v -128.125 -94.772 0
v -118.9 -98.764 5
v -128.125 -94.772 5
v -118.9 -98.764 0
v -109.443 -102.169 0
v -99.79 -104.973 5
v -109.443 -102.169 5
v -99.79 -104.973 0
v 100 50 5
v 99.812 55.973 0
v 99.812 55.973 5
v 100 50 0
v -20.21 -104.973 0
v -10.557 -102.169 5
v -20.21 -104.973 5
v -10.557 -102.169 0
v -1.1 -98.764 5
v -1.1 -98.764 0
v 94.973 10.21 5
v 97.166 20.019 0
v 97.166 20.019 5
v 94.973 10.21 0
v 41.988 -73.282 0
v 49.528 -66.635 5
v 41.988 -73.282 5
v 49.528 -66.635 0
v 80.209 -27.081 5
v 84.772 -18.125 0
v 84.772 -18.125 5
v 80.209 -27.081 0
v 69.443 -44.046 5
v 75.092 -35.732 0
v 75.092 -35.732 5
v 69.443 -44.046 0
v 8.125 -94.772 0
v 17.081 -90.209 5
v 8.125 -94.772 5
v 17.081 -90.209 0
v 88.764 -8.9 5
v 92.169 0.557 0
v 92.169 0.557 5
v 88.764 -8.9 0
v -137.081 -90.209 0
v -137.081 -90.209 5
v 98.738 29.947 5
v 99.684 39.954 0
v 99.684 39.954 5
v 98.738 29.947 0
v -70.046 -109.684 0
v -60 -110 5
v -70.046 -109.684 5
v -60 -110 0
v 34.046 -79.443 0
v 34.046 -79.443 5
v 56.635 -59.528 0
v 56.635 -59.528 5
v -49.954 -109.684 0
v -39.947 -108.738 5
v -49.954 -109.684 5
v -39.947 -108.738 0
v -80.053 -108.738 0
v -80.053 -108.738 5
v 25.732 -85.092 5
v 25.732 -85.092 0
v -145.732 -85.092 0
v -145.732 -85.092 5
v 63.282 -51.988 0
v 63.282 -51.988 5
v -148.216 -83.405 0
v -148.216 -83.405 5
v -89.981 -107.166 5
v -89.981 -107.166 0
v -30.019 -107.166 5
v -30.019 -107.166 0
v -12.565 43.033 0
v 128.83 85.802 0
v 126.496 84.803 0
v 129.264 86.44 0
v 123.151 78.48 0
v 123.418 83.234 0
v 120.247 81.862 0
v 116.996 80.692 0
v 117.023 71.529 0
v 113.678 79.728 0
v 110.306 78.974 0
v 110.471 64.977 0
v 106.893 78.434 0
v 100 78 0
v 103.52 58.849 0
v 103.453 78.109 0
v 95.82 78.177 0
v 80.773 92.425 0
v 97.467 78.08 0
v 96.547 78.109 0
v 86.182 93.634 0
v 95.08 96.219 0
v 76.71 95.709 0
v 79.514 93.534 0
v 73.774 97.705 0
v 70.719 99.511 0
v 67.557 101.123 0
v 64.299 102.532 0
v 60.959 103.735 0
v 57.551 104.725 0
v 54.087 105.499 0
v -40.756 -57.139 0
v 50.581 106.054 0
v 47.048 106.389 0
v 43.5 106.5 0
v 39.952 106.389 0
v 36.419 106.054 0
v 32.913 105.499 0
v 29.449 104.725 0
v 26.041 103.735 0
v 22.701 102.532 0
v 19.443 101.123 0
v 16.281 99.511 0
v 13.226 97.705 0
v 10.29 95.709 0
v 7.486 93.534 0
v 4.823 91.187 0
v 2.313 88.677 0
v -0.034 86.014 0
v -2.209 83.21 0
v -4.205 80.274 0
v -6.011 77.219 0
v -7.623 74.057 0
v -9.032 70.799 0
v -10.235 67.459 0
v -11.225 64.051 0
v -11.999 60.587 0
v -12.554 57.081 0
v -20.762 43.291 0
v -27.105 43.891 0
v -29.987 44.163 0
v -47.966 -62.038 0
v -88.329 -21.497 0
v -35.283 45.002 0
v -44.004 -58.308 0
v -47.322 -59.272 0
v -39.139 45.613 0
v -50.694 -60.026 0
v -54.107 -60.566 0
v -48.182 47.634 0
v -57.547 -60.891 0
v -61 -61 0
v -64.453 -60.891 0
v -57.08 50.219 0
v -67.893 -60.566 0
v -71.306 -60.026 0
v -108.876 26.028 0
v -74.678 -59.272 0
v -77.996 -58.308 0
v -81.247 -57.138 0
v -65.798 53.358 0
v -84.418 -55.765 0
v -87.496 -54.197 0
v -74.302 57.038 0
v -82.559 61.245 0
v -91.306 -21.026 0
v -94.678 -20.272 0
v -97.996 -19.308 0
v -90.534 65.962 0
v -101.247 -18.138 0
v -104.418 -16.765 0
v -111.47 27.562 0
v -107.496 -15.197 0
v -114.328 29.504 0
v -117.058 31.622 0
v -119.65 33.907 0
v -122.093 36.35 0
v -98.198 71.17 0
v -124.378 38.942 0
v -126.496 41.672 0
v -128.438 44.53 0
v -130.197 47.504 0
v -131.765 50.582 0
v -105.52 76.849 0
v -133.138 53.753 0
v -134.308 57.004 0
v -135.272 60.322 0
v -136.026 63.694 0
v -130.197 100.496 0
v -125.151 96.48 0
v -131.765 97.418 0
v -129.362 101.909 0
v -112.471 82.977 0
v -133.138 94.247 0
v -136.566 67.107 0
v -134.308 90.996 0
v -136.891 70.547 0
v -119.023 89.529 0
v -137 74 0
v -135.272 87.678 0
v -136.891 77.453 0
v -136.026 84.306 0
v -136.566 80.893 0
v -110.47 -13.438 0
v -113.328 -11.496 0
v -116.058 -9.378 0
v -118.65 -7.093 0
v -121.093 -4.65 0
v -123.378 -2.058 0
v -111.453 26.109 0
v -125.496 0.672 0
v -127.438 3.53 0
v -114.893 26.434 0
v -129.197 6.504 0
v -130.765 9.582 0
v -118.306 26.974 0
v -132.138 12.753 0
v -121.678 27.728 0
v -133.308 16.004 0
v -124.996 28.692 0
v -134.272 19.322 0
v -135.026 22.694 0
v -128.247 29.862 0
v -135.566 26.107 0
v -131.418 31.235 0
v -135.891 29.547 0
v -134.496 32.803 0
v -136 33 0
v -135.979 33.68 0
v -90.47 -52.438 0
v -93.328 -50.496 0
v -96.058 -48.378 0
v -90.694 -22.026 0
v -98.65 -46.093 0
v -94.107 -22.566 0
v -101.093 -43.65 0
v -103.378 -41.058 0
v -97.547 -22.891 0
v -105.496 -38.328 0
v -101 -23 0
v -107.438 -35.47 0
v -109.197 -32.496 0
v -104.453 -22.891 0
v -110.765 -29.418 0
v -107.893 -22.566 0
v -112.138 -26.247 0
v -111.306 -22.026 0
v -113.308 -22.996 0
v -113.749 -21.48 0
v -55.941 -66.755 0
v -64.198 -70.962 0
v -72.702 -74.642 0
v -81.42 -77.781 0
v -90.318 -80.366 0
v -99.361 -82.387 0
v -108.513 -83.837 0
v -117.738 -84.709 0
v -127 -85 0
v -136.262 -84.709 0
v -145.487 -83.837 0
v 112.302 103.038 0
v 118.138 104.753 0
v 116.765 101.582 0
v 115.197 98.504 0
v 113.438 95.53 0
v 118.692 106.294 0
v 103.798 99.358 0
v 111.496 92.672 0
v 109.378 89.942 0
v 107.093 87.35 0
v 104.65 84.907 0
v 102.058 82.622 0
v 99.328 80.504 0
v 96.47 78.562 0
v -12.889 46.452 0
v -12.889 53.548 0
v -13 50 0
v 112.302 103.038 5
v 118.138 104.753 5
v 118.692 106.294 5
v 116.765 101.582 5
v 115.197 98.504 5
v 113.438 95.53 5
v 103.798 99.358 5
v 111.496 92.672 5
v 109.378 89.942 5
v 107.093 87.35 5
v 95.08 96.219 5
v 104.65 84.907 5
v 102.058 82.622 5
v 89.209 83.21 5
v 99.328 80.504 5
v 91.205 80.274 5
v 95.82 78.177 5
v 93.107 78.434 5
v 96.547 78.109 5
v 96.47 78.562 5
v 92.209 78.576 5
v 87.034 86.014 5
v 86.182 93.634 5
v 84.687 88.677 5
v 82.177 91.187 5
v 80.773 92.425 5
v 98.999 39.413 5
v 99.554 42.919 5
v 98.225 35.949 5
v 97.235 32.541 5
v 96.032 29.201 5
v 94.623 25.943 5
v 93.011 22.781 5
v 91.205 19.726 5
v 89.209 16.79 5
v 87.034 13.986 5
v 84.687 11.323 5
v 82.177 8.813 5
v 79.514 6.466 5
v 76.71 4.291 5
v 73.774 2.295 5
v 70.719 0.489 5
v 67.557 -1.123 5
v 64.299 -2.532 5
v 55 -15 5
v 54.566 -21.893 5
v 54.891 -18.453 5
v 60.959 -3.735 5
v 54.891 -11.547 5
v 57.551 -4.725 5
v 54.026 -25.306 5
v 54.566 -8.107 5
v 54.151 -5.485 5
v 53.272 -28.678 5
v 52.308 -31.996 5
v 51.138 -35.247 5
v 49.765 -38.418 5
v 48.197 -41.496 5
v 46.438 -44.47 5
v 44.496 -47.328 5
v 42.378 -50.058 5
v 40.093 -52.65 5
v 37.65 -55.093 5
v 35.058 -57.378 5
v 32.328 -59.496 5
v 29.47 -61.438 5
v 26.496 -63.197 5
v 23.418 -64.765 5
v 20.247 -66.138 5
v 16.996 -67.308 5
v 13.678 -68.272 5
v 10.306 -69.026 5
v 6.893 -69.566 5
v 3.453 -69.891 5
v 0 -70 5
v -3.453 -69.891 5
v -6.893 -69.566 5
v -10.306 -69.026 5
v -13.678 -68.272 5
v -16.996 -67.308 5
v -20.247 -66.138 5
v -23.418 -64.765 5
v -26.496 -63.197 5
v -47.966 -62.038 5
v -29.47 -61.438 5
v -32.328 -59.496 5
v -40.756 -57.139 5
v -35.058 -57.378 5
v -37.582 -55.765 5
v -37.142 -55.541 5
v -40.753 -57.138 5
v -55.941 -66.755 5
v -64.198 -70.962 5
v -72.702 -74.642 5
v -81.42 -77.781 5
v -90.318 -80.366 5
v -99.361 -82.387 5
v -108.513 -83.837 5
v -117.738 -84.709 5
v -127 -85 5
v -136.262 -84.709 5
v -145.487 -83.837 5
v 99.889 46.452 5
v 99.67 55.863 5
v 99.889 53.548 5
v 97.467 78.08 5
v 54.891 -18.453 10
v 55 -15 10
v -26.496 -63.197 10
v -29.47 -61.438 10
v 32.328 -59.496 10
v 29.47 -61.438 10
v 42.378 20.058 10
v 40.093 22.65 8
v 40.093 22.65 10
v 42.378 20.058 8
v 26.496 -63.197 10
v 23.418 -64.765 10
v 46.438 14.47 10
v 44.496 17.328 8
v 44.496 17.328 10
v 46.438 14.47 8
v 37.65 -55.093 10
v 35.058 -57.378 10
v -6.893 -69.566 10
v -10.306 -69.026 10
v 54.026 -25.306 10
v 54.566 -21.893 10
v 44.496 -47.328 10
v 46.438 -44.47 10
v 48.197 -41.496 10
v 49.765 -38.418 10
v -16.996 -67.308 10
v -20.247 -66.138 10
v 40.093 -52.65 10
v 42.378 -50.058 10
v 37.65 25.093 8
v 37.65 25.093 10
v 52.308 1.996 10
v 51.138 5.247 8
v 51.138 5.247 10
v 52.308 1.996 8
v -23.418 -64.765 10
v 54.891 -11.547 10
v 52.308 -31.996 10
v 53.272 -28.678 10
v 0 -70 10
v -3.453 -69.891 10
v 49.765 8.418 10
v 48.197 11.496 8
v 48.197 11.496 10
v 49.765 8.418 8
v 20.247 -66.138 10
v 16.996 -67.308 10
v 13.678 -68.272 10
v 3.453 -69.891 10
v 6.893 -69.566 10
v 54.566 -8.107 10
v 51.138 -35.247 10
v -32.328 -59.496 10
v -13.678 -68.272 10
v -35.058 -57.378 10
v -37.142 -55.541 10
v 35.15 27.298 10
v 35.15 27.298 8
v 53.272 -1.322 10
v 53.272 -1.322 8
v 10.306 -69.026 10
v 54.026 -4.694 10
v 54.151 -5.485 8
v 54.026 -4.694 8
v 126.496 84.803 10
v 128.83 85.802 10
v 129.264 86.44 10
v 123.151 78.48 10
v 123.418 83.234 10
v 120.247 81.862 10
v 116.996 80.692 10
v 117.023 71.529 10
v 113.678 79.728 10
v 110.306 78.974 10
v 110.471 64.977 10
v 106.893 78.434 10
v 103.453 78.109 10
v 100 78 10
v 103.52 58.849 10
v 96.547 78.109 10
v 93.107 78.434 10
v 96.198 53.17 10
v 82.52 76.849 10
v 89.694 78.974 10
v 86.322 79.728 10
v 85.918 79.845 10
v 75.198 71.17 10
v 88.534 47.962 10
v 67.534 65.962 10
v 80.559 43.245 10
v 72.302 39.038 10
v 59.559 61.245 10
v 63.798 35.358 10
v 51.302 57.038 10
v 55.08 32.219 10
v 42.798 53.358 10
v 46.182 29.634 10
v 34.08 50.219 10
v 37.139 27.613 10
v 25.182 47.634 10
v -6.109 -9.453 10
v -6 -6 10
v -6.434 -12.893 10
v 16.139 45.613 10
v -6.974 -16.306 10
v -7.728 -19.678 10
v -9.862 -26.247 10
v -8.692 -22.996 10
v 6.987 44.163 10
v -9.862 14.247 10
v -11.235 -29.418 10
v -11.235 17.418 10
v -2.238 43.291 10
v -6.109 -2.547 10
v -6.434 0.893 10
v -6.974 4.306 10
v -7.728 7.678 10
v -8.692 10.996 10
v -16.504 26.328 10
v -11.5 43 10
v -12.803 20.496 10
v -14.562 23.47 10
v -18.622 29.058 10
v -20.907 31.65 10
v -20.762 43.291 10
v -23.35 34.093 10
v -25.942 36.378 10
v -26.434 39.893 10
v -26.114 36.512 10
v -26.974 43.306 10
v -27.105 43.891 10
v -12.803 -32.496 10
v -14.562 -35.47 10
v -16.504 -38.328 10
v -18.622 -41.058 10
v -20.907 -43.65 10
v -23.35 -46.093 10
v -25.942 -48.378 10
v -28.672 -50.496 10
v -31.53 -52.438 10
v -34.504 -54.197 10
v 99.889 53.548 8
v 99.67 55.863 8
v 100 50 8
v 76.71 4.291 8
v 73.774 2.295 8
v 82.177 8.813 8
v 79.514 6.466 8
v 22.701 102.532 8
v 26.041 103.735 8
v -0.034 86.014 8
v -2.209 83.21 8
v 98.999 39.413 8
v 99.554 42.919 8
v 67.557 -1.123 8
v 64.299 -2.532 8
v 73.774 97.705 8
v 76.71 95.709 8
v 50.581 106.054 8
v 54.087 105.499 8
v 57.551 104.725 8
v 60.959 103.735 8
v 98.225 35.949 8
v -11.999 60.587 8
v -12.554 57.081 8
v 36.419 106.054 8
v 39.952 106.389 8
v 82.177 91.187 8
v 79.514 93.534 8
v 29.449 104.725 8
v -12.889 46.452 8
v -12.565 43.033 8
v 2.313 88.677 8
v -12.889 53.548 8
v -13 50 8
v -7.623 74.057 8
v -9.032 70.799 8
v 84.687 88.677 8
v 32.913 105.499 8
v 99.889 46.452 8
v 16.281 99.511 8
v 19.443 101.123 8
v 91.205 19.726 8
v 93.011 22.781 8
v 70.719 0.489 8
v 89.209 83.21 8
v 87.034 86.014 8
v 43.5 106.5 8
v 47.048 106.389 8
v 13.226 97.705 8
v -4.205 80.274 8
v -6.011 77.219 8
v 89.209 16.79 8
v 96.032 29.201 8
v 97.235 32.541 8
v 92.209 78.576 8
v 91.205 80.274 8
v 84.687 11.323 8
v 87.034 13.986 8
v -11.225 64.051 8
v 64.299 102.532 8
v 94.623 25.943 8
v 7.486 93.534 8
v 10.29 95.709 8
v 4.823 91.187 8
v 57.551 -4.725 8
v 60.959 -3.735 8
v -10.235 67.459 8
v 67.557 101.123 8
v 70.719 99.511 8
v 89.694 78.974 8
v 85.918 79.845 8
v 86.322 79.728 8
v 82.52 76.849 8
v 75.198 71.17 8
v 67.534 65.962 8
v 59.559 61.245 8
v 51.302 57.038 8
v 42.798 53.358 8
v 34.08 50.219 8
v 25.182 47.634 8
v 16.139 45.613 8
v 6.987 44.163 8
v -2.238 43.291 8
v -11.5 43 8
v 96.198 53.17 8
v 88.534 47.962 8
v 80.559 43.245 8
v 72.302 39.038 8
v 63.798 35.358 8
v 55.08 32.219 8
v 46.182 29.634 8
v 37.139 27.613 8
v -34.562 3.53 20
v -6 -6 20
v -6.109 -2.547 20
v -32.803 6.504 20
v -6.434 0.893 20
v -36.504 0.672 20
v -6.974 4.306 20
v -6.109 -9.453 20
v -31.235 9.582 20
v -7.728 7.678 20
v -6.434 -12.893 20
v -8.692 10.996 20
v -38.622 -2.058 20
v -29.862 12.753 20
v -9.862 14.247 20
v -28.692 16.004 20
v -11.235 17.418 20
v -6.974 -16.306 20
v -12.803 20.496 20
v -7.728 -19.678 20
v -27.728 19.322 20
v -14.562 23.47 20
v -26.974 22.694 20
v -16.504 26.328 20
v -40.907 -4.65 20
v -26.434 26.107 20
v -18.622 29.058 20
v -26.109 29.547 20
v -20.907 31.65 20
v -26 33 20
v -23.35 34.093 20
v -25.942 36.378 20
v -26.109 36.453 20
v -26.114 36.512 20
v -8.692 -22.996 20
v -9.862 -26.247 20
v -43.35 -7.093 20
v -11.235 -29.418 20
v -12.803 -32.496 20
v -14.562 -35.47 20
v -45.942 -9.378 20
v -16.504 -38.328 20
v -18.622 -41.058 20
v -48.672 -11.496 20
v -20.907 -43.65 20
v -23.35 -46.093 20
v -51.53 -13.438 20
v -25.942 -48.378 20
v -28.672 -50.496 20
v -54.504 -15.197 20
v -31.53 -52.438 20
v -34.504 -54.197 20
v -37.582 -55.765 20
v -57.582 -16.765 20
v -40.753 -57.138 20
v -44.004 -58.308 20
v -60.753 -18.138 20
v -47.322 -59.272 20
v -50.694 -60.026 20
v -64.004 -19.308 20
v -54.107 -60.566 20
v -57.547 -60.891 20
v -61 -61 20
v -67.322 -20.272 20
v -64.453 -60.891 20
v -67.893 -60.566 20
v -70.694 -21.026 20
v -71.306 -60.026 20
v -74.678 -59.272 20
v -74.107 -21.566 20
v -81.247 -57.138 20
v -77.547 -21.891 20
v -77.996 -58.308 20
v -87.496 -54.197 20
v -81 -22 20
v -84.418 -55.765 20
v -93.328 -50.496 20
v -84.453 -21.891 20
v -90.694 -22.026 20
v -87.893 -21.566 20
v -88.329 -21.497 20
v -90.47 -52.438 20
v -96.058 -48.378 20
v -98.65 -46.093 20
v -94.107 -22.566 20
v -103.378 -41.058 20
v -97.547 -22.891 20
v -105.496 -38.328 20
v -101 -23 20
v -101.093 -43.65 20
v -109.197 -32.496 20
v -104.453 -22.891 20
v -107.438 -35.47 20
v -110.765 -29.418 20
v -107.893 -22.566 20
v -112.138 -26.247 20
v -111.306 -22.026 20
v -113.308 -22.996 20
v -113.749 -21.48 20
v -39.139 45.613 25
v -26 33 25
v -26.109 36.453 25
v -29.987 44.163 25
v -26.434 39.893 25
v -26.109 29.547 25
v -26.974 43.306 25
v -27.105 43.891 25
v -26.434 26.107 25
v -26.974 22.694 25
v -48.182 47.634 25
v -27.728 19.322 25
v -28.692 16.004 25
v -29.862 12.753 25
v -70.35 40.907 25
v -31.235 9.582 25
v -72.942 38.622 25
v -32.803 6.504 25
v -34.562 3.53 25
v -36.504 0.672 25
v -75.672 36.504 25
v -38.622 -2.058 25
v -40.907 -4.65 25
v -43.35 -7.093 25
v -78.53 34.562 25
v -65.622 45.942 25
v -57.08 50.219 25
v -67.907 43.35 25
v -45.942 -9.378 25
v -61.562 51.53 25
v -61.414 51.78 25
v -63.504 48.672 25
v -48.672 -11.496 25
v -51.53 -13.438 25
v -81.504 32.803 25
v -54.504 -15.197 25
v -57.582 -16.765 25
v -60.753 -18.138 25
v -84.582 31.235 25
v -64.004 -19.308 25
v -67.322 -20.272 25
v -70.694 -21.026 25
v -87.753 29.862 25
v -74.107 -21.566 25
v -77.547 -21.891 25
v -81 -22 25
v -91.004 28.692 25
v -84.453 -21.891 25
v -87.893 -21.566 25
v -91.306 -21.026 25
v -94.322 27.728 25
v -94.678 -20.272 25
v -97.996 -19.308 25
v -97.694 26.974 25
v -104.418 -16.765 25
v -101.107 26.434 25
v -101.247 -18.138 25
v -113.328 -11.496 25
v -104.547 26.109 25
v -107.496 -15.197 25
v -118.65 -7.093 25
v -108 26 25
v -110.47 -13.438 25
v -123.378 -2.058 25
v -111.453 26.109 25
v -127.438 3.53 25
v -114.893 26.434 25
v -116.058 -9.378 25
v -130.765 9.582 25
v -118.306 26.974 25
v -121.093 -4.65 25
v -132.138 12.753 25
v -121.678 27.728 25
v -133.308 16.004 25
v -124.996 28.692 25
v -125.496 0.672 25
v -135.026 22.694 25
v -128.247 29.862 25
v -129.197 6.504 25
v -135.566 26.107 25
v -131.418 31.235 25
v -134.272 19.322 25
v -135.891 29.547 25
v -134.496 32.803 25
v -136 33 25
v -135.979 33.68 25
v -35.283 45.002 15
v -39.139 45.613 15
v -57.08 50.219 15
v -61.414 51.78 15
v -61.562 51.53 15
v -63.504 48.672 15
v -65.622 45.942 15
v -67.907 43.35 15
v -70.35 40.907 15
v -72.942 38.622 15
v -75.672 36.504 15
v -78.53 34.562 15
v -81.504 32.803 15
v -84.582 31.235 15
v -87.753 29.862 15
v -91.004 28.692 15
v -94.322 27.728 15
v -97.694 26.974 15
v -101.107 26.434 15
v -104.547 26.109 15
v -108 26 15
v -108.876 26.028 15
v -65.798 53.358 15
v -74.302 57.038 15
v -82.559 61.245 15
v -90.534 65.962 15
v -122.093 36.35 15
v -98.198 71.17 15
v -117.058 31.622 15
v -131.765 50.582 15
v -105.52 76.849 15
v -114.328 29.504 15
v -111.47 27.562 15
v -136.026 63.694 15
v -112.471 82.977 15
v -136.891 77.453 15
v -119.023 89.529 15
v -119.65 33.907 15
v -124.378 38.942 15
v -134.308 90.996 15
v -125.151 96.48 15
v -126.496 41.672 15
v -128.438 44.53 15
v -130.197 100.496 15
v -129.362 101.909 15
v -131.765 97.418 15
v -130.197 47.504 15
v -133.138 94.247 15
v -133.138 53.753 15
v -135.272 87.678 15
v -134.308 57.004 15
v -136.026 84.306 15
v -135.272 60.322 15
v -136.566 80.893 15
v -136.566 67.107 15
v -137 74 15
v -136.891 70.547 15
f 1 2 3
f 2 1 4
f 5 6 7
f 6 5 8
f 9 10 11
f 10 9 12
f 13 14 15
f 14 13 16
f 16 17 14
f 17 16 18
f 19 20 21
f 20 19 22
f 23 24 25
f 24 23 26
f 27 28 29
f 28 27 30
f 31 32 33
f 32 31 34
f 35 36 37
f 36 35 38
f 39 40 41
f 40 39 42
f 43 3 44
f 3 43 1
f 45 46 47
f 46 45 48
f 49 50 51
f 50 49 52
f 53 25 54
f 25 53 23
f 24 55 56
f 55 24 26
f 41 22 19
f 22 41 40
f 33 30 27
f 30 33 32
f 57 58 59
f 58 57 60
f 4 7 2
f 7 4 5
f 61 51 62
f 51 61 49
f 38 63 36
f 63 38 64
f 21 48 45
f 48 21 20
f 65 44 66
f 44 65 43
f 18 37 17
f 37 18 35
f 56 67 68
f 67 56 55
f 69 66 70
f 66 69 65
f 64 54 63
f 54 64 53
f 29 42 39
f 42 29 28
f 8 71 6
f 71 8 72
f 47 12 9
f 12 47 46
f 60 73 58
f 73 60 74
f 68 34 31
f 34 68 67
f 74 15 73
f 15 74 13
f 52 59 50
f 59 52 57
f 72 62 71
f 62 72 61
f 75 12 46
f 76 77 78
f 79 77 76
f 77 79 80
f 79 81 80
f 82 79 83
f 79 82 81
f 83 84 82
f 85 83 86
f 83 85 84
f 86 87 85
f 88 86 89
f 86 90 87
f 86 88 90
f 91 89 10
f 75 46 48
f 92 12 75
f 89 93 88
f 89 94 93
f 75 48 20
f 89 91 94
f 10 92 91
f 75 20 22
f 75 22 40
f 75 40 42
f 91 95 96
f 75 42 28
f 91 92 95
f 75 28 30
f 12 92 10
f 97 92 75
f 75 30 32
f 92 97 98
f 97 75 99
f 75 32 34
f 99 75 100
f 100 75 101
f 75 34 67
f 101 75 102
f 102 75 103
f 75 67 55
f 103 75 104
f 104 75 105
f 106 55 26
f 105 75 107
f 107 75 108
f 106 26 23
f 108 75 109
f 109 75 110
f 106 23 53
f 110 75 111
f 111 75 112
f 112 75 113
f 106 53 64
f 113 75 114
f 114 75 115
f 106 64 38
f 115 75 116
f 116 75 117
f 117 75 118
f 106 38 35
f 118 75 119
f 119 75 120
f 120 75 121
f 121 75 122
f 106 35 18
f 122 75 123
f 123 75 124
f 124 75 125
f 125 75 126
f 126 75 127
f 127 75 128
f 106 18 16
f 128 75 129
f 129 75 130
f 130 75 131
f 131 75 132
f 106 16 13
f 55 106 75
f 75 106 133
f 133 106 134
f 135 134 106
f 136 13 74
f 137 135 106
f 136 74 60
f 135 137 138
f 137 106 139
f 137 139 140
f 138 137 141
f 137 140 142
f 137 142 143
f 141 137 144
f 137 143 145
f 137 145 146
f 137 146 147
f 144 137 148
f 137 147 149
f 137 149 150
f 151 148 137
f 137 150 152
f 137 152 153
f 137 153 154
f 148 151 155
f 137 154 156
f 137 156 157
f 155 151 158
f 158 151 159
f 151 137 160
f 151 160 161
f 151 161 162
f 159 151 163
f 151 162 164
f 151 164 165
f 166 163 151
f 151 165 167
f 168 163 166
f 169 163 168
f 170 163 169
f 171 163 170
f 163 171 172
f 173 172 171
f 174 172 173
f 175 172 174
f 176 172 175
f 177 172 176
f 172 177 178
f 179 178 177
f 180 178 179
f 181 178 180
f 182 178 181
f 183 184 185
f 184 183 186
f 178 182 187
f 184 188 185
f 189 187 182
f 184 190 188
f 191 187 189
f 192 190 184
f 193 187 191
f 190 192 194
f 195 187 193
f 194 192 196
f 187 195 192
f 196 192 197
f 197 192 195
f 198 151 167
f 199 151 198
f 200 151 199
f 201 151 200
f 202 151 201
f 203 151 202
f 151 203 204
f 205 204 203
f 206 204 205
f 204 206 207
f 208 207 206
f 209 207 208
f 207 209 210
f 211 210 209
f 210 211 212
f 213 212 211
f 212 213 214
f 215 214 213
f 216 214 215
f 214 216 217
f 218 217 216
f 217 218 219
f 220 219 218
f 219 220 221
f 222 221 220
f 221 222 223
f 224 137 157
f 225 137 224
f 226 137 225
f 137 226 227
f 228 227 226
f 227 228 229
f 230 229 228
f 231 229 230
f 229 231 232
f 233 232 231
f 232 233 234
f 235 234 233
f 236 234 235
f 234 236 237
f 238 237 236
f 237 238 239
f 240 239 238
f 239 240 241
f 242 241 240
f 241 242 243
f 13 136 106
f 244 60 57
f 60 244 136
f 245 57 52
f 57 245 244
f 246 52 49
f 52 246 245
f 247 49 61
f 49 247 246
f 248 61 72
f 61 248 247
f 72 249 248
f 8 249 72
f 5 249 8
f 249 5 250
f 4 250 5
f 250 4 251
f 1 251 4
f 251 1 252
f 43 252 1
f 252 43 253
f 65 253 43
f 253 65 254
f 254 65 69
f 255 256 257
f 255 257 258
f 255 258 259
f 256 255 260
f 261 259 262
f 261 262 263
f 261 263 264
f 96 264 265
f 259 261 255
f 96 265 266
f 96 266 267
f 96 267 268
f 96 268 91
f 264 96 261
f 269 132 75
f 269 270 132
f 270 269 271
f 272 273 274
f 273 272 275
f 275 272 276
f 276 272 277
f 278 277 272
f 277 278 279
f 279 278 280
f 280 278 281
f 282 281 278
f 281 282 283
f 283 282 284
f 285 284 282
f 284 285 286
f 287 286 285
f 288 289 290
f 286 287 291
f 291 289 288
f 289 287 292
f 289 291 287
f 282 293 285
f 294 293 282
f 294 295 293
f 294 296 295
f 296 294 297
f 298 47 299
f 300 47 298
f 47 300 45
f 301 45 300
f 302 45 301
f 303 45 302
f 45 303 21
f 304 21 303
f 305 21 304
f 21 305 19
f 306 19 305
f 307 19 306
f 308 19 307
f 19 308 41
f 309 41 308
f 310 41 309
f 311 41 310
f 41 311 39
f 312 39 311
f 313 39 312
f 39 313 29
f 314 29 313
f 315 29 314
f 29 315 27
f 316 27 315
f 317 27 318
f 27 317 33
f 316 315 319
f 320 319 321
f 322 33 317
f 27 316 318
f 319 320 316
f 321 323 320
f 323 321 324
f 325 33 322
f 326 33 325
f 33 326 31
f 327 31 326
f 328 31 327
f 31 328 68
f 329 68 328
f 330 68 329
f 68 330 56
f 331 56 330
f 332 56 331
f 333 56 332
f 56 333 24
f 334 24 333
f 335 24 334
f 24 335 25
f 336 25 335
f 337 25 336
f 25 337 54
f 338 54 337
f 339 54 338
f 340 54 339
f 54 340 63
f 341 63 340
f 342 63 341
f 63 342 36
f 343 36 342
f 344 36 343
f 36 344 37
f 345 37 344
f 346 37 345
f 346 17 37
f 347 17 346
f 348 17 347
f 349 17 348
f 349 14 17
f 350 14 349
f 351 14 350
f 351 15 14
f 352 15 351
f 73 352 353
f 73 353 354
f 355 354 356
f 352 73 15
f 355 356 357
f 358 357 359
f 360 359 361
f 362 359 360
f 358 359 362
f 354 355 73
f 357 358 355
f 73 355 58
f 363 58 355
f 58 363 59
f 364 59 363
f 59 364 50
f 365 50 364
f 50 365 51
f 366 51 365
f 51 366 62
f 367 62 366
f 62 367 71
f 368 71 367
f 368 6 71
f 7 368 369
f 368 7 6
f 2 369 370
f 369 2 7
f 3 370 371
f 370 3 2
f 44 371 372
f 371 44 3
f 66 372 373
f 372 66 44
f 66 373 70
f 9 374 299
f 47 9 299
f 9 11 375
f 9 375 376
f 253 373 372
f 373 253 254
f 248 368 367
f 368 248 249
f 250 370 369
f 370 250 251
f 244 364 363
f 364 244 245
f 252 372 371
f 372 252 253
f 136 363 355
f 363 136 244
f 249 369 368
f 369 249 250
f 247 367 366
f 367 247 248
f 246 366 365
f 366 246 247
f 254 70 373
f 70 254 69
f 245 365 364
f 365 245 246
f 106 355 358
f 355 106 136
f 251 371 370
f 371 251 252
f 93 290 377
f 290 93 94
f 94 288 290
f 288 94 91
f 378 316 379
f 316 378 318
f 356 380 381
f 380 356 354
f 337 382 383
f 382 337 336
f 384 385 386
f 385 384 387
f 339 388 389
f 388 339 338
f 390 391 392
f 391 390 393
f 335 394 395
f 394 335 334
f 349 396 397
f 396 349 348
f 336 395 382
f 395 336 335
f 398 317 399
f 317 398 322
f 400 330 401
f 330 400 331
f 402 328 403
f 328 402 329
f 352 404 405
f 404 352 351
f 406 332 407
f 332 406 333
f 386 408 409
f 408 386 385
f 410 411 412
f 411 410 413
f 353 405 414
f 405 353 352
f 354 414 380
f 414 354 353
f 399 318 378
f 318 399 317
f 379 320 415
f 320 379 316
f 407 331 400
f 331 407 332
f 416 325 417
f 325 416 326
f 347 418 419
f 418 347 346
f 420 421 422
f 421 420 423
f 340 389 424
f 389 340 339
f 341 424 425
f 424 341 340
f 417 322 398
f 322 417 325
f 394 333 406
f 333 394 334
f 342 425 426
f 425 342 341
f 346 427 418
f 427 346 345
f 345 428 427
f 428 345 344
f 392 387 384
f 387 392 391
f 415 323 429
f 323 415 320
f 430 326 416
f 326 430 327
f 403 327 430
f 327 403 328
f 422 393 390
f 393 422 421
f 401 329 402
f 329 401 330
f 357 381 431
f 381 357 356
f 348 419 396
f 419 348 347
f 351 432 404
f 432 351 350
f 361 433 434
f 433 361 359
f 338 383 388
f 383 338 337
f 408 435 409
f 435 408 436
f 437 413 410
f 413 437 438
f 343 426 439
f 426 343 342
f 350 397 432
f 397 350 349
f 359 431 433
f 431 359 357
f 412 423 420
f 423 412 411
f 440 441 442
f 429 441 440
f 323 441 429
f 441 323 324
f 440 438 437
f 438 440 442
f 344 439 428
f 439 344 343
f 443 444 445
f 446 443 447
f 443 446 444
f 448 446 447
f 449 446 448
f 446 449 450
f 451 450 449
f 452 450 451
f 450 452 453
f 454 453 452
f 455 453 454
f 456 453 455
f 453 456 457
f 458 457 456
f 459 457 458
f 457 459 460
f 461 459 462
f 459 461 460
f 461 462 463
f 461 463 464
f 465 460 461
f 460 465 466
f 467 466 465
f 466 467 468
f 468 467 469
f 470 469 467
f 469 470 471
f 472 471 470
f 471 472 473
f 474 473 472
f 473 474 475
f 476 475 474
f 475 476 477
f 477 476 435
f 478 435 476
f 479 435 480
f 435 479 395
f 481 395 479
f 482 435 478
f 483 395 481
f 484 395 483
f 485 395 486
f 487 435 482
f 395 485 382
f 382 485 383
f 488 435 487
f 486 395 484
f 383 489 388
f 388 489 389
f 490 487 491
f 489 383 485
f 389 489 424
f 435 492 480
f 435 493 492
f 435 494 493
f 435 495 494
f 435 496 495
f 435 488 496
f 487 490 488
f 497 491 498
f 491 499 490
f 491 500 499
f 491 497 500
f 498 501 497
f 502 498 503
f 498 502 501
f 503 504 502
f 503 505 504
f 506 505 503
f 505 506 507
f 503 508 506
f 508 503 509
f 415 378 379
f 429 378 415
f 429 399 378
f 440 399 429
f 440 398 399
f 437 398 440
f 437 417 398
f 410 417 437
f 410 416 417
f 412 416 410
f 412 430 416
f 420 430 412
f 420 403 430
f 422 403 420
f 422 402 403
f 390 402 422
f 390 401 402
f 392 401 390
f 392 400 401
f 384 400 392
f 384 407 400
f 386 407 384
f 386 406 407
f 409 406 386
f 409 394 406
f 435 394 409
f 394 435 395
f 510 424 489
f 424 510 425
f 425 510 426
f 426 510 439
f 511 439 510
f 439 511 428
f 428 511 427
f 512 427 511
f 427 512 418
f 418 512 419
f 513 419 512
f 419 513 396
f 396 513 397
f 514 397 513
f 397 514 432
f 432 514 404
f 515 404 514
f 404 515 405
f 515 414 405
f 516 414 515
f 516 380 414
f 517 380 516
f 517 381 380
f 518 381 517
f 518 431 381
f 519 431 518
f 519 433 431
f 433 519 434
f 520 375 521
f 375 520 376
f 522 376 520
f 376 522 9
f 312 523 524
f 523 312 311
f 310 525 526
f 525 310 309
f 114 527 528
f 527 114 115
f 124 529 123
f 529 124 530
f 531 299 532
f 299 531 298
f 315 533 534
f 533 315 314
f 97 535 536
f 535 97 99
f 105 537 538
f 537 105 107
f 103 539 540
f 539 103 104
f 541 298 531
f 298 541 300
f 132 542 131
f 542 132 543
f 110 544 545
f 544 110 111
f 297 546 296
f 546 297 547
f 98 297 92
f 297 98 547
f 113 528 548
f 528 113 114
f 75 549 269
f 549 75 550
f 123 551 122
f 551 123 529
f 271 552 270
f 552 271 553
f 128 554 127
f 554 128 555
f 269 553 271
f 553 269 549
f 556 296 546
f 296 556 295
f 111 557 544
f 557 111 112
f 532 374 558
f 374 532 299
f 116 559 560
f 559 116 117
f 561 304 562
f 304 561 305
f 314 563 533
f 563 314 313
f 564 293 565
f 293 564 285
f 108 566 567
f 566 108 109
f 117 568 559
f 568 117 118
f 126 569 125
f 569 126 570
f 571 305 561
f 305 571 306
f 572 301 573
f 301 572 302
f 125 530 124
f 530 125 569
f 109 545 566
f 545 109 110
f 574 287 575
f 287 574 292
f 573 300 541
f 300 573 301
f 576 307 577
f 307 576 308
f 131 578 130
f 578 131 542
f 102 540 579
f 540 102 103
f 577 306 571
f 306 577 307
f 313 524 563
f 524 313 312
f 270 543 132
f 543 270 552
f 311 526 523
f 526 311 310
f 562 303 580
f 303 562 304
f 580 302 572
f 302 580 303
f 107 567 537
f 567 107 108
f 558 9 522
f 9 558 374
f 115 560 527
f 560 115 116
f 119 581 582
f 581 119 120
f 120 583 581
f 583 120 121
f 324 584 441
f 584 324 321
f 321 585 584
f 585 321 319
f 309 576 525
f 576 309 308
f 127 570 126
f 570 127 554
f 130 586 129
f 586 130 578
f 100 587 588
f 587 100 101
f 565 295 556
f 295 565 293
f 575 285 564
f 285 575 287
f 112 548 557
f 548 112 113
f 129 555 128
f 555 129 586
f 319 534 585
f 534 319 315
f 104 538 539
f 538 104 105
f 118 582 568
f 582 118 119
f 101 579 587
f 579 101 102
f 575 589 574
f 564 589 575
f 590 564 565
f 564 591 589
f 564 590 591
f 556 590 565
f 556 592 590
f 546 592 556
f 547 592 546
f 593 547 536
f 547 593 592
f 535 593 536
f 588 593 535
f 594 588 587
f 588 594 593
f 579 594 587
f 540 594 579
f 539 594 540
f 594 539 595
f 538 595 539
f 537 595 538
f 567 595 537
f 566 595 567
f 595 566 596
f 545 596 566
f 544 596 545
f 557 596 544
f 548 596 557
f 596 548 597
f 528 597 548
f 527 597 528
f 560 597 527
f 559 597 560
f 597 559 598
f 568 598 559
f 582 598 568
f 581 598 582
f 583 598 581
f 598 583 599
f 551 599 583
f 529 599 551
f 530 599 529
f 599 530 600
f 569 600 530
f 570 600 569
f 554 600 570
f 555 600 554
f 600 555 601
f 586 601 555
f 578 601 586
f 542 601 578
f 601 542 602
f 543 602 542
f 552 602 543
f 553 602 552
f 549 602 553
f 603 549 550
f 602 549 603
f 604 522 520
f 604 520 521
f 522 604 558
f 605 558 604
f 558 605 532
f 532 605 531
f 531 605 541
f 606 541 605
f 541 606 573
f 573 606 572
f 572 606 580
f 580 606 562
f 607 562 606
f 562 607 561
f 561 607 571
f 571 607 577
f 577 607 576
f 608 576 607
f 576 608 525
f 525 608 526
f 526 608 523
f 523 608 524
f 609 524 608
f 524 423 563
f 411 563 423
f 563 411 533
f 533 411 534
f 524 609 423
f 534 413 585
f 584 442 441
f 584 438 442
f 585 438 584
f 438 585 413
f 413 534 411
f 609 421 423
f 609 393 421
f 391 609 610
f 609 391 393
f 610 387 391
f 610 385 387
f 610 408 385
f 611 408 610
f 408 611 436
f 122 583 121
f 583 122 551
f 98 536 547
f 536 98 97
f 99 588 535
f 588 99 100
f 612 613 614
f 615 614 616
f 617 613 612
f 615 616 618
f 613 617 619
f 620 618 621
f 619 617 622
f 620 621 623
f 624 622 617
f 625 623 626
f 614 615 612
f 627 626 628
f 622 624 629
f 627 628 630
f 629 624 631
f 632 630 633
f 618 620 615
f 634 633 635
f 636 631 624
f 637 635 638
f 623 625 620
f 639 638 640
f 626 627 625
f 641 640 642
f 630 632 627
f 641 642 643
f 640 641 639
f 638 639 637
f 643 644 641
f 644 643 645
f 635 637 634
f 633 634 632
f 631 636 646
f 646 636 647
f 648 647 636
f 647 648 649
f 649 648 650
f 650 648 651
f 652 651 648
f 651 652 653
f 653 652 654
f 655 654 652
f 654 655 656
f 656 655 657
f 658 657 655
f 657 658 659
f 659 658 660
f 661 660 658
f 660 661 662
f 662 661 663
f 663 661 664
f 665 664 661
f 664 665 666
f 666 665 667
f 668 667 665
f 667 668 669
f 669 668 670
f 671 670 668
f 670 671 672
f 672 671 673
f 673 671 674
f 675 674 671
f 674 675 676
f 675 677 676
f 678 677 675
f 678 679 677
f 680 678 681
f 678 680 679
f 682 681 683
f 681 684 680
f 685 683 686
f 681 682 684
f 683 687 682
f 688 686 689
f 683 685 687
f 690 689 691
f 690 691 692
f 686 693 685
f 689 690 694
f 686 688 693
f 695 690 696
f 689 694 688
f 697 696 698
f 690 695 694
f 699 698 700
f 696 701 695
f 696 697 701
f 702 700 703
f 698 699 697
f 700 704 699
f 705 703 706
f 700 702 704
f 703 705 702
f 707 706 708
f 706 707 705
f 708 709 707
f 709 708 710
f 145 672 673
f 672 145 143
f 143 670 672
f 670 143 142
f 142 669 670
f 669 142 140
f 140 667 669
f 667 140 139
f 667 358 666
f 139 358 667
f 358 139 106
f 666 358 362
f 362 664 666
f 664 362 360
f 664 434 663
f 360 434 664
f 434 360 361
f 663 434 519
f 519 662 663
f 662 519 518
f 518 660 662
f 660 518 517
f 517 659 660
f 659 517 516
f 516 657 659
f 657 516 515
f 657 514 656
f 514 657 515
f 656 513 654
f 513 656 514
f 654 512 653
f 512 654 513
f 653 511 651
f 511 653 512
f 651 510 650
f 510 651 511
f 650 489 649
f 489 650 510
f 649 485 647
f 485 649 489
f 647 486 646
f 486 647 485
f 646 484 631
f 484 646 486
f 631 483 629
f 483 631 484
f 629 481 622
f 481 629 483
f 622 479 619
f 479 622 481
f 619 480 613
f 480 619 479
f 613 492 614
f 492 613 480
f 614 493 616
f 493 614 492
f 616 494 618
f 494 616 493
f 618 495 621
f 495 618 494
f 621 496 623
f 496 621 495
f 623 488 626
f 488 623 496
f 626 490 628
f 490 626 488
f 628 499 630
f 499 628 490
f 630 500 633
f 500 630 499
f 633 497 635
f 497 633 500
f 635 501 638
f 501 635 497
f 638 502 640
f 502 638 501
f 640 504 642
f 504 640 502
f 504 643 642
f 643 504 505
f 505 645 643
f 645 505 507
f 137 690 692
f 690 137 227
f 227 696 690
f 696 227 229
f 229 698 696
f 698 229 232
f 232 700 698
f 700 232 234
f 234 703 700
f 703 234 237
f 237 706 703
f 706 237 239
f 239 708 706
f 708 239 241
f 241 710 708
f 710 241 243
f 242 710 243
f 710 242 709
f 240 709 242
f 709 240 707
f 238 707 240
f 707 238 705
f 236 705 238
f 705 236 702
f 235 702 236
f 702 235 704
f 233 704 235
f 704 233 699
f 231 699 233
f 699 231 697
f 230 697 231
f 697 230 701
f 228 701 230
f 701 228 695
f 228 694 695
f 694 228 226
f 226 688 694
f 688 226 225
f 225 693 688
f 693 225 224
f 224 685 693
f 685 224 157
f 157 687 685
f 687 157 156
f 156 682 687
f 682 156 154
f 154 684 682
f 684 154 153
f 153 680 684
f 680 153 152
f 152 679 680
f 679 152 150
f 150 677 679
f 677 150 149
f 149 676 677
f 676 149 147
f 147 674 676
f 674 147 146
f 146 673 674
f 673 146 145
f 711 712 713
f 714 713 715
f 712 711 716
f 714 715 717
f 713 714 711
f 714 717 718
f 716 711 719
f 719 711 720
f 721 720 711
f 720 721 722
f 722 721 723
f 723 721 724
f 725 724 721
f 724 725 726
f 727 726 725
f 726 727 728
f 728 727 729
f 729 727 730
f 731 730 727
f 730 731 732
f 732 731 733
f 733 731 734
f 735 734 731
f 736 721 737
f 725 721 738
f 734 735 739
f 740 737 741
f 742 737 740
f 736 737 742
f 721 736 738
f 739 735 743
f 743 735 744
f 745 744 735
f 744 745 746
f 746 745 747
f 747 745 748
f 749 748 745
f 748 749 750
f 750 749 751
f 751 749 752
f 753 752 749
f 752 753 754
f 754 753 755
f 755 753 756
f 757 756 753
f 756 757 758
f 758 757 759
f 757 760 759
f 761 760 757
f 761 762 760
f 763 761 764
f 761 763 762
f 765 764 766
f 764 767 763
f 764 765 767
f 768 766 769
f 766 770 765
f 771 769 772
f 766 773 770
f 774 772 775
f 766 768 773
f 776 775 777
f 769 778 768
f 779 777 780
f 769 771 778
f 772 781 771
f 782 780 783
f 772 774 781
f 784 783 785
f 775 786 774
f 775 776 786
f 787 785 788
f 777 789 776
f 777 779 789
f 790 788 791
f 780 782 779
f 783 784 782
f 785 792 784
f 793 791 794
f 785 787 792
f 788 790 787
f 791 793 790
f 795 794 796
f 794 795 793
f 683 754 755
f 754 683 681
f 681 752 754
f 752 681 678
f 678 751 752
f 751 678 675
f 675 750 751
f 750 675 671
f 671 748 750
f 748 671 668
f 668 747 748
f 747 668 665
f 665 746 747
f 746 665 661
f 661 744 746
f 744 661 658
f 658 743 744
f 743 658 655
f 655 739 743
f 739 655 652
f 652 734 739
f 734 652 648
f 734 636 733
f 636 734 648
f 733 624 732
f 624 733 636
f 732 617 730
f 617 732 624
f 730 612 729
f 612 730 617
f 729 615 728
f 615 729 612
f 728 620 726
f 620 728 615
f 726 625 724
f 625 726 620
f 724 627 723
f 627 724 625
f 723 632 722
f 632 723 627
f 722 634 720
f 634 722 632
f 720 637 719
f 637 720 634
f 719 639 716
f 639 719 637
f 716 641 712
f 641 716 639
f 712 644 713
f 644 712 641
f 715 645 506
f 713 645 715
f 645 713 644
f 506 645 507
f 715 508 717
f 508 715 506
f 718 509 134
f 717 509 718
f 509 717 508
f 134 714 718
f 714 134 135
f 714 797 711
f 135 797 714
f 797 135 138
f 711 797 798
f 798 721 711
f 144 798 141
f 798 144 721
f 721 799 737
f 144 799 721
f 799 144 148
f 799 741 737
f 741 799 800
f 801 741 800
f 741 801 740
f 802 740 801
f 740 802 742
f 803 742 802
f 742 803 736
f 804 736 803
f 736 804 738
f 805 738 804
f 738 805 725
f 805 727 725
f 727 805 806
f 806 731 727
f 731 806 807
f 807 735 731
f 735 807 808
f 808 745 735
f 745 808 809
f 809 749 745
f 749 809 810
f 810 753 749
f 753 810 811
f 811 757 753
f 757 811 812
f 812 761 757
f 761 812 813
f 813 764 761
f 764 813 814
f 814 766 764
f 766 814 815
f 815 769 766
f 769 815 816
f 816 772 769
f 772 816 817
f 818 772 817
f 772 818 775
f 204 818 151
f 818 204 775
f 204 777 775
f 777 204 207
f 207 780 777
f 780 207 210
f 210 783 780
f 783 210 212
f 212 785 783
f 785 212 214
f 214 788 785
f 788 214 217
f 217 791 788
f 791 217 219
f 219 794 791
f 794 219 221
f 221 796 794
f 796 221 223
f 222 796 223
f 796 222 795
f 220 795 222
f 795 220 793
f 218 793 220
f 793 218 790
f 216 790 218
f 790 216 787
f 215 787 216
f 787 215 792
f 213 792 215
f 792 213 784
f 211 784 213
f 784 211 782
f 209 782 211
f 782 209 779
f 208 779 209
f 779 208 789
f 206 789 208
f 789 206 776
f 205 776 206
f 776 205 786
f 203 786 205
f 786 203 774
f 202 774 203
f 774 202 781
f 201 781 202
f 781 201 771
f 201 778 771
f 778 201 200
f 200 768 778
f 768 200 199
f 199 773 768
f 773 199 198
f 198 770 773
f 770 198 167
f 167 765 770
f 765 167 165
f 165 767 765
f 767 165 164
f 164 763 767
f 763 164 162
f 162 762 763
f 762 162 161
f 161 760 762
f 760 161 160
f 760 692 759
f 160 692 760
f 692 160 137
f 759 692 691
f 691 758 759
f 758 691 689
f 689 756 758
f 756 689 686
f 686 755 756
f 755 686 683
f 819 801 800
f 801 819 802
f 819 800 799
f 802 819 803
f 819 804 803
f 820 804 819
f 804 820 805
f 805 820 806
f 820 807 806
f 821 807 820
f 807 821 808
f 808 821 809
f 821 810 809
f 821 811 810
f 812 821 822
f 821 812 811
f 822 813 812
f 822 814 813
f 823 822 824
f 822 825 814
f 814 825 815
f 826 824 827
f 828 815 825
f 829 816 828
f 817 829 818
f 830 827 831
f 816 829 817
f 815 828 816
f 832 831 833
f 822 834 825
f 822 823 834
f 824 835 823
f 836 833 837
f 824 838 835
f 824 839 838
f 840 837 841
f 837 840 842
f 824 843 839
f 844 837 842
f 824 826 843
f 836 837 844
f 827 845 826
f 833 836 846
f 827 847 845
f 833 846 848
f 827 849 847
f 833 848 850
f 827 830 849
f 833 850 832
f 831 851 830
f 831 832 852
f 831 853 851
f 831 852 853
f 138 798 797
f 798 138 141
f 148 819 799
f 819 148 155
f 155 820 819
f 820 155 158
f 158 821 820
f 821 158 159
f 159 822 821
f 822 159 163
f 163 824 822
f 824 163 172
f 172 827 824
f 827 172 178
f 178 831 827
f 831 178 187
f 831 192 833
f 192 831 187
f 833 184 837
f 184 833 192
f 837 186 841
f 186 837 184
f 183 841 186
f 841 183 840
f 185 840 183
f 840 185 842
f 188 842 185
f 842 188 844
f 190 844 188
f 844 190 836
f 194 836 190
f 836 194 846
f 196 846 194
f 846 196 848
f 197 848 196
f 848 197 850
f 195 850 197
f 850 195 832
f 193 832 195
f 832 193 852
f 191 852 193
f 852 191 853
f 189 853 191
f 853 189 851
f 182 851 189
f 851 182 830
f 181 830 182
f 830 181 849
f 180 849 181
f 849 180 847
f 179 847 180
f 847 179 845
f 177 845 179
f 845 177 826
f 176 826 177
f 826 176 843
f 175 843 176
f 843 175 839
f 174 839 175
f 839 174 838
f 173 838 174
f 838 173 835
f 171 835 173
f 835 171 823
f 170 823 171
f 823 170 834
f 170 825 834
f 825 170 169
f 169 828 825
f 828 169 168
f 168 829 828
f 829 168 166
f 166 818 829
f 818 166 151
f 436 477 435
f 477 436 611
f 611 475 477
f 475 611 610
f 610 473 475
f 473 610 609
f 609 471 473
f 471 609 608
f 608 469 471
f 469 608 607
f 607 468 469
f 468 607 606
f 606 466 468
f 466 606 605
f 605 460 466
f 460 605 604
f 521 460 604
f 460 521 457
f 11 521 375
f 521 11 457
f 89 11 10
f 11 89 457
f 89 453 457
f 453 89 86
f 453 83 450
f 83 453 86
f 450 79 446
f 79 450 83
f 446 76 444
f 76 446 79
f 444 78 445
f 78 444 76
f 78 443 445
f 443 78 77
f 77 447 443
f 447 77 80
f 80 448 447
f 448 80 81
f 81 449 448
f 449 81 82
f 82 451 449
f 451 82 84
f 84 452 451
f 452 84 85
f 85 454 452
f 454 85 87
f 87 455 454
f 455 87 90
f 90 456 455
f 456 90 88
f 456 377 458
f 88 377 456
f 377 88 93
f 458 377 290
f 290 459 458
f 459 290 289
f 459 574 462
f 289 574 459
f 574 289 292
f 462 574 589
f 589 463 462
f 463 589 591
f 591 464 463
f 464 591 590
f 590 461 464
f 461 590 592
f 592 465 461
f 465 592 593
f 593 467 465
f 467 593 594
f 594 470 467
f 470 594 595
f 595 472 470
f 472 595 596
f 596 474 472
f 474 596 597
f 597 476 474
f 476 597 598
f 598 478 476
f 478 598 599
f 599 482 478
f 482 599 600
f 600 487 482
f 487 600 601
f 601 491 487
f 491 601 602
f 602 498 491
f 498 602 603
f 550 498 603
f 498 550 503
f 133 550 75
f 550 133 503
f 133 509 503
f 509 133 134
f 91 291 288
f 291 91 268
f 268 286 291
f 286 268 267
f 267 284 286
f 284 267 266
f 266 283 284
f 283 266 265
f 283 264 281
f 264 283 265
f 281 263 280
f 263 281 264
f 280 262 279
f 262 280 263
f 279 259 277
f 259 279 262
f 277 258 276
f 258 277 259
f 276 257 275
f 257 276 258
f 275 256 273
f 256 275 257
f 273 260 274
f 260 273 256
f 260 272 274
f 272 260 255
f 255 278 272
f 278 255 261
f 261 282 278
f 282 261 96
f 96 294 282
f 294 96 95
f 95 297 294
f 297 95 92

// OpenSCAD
$fn=100;

module larry() {
	translate( [-60,50,0]) {
		// body fill
		linear_extrude(10) translate( [60,-65,0] ) circle( r=55 );
		difference() {
			// bottom of body
			linear_extrude(5) circle(r=160);
			// top of tail
			linear_extrude(10) translate( [-67,12.5,0] ) circle(r=147.5);
			// top of wing
			linear_extrude(20)translate( [12.5+36,-12.5+153,0] ) circle(r=147.5);
			// top of bottom half of beak
			linear_extrude(15) translate( [-105+265,-105+188,0] ) circle( r=55 );
		}
		// head
		linear_extrude(8) translate( [103.5,0,0] ) circle( r=56.5 );
		
		linear_extrude(20) difference() {
			// bottom-most wing feather
			translate( [-105+104,-56,0] ) circle(r=55);
			translate( [-41,-18,0] ) circle(r=55);
		}
		
		linear_extrude(25) difference() {
			// central wing feather
			translate( [-105+84,-105+88,0] ) circle( r=55 );
			translate( [-105+57,-105+88+48,0] ) circle( r=55 );
			// clip central wing feather off top of body
			translate( [12.5+36,-12.5+153,0] ) circle(r=147.5);
		}
		
		linear_extrude(15) difference() {
			// top of wing
			color("orange") translate( [-105+83,-105+129,0] ) circle( r=55 );
			translate( [12.5+36,-12.5+153,0] ) circle(r=147.5);
		}
		
		linear_extrude(10) difference() {
			// bottom beak
			color("teal") translate( [-12.5+82,-12.5+135,0] ) circle( r=147.5 );
			translate( [12.5+36,-12.5+153,0] ) circle(r=147.5);
			translate( [-105+265,-105+188,0] ) circle( r=55 );
			translate( [120,80] ) square( [100,200] );
		}
		
		linear_extrude(5) difference() {
			// top beak
			color("firebrick") translate( [-105+232,-105+180,0] ) circle( r=55 );
			translate( [-12.5+122,-12.5+199,0] ) circle( r=147.5 );
		}
	}
}

larry();
